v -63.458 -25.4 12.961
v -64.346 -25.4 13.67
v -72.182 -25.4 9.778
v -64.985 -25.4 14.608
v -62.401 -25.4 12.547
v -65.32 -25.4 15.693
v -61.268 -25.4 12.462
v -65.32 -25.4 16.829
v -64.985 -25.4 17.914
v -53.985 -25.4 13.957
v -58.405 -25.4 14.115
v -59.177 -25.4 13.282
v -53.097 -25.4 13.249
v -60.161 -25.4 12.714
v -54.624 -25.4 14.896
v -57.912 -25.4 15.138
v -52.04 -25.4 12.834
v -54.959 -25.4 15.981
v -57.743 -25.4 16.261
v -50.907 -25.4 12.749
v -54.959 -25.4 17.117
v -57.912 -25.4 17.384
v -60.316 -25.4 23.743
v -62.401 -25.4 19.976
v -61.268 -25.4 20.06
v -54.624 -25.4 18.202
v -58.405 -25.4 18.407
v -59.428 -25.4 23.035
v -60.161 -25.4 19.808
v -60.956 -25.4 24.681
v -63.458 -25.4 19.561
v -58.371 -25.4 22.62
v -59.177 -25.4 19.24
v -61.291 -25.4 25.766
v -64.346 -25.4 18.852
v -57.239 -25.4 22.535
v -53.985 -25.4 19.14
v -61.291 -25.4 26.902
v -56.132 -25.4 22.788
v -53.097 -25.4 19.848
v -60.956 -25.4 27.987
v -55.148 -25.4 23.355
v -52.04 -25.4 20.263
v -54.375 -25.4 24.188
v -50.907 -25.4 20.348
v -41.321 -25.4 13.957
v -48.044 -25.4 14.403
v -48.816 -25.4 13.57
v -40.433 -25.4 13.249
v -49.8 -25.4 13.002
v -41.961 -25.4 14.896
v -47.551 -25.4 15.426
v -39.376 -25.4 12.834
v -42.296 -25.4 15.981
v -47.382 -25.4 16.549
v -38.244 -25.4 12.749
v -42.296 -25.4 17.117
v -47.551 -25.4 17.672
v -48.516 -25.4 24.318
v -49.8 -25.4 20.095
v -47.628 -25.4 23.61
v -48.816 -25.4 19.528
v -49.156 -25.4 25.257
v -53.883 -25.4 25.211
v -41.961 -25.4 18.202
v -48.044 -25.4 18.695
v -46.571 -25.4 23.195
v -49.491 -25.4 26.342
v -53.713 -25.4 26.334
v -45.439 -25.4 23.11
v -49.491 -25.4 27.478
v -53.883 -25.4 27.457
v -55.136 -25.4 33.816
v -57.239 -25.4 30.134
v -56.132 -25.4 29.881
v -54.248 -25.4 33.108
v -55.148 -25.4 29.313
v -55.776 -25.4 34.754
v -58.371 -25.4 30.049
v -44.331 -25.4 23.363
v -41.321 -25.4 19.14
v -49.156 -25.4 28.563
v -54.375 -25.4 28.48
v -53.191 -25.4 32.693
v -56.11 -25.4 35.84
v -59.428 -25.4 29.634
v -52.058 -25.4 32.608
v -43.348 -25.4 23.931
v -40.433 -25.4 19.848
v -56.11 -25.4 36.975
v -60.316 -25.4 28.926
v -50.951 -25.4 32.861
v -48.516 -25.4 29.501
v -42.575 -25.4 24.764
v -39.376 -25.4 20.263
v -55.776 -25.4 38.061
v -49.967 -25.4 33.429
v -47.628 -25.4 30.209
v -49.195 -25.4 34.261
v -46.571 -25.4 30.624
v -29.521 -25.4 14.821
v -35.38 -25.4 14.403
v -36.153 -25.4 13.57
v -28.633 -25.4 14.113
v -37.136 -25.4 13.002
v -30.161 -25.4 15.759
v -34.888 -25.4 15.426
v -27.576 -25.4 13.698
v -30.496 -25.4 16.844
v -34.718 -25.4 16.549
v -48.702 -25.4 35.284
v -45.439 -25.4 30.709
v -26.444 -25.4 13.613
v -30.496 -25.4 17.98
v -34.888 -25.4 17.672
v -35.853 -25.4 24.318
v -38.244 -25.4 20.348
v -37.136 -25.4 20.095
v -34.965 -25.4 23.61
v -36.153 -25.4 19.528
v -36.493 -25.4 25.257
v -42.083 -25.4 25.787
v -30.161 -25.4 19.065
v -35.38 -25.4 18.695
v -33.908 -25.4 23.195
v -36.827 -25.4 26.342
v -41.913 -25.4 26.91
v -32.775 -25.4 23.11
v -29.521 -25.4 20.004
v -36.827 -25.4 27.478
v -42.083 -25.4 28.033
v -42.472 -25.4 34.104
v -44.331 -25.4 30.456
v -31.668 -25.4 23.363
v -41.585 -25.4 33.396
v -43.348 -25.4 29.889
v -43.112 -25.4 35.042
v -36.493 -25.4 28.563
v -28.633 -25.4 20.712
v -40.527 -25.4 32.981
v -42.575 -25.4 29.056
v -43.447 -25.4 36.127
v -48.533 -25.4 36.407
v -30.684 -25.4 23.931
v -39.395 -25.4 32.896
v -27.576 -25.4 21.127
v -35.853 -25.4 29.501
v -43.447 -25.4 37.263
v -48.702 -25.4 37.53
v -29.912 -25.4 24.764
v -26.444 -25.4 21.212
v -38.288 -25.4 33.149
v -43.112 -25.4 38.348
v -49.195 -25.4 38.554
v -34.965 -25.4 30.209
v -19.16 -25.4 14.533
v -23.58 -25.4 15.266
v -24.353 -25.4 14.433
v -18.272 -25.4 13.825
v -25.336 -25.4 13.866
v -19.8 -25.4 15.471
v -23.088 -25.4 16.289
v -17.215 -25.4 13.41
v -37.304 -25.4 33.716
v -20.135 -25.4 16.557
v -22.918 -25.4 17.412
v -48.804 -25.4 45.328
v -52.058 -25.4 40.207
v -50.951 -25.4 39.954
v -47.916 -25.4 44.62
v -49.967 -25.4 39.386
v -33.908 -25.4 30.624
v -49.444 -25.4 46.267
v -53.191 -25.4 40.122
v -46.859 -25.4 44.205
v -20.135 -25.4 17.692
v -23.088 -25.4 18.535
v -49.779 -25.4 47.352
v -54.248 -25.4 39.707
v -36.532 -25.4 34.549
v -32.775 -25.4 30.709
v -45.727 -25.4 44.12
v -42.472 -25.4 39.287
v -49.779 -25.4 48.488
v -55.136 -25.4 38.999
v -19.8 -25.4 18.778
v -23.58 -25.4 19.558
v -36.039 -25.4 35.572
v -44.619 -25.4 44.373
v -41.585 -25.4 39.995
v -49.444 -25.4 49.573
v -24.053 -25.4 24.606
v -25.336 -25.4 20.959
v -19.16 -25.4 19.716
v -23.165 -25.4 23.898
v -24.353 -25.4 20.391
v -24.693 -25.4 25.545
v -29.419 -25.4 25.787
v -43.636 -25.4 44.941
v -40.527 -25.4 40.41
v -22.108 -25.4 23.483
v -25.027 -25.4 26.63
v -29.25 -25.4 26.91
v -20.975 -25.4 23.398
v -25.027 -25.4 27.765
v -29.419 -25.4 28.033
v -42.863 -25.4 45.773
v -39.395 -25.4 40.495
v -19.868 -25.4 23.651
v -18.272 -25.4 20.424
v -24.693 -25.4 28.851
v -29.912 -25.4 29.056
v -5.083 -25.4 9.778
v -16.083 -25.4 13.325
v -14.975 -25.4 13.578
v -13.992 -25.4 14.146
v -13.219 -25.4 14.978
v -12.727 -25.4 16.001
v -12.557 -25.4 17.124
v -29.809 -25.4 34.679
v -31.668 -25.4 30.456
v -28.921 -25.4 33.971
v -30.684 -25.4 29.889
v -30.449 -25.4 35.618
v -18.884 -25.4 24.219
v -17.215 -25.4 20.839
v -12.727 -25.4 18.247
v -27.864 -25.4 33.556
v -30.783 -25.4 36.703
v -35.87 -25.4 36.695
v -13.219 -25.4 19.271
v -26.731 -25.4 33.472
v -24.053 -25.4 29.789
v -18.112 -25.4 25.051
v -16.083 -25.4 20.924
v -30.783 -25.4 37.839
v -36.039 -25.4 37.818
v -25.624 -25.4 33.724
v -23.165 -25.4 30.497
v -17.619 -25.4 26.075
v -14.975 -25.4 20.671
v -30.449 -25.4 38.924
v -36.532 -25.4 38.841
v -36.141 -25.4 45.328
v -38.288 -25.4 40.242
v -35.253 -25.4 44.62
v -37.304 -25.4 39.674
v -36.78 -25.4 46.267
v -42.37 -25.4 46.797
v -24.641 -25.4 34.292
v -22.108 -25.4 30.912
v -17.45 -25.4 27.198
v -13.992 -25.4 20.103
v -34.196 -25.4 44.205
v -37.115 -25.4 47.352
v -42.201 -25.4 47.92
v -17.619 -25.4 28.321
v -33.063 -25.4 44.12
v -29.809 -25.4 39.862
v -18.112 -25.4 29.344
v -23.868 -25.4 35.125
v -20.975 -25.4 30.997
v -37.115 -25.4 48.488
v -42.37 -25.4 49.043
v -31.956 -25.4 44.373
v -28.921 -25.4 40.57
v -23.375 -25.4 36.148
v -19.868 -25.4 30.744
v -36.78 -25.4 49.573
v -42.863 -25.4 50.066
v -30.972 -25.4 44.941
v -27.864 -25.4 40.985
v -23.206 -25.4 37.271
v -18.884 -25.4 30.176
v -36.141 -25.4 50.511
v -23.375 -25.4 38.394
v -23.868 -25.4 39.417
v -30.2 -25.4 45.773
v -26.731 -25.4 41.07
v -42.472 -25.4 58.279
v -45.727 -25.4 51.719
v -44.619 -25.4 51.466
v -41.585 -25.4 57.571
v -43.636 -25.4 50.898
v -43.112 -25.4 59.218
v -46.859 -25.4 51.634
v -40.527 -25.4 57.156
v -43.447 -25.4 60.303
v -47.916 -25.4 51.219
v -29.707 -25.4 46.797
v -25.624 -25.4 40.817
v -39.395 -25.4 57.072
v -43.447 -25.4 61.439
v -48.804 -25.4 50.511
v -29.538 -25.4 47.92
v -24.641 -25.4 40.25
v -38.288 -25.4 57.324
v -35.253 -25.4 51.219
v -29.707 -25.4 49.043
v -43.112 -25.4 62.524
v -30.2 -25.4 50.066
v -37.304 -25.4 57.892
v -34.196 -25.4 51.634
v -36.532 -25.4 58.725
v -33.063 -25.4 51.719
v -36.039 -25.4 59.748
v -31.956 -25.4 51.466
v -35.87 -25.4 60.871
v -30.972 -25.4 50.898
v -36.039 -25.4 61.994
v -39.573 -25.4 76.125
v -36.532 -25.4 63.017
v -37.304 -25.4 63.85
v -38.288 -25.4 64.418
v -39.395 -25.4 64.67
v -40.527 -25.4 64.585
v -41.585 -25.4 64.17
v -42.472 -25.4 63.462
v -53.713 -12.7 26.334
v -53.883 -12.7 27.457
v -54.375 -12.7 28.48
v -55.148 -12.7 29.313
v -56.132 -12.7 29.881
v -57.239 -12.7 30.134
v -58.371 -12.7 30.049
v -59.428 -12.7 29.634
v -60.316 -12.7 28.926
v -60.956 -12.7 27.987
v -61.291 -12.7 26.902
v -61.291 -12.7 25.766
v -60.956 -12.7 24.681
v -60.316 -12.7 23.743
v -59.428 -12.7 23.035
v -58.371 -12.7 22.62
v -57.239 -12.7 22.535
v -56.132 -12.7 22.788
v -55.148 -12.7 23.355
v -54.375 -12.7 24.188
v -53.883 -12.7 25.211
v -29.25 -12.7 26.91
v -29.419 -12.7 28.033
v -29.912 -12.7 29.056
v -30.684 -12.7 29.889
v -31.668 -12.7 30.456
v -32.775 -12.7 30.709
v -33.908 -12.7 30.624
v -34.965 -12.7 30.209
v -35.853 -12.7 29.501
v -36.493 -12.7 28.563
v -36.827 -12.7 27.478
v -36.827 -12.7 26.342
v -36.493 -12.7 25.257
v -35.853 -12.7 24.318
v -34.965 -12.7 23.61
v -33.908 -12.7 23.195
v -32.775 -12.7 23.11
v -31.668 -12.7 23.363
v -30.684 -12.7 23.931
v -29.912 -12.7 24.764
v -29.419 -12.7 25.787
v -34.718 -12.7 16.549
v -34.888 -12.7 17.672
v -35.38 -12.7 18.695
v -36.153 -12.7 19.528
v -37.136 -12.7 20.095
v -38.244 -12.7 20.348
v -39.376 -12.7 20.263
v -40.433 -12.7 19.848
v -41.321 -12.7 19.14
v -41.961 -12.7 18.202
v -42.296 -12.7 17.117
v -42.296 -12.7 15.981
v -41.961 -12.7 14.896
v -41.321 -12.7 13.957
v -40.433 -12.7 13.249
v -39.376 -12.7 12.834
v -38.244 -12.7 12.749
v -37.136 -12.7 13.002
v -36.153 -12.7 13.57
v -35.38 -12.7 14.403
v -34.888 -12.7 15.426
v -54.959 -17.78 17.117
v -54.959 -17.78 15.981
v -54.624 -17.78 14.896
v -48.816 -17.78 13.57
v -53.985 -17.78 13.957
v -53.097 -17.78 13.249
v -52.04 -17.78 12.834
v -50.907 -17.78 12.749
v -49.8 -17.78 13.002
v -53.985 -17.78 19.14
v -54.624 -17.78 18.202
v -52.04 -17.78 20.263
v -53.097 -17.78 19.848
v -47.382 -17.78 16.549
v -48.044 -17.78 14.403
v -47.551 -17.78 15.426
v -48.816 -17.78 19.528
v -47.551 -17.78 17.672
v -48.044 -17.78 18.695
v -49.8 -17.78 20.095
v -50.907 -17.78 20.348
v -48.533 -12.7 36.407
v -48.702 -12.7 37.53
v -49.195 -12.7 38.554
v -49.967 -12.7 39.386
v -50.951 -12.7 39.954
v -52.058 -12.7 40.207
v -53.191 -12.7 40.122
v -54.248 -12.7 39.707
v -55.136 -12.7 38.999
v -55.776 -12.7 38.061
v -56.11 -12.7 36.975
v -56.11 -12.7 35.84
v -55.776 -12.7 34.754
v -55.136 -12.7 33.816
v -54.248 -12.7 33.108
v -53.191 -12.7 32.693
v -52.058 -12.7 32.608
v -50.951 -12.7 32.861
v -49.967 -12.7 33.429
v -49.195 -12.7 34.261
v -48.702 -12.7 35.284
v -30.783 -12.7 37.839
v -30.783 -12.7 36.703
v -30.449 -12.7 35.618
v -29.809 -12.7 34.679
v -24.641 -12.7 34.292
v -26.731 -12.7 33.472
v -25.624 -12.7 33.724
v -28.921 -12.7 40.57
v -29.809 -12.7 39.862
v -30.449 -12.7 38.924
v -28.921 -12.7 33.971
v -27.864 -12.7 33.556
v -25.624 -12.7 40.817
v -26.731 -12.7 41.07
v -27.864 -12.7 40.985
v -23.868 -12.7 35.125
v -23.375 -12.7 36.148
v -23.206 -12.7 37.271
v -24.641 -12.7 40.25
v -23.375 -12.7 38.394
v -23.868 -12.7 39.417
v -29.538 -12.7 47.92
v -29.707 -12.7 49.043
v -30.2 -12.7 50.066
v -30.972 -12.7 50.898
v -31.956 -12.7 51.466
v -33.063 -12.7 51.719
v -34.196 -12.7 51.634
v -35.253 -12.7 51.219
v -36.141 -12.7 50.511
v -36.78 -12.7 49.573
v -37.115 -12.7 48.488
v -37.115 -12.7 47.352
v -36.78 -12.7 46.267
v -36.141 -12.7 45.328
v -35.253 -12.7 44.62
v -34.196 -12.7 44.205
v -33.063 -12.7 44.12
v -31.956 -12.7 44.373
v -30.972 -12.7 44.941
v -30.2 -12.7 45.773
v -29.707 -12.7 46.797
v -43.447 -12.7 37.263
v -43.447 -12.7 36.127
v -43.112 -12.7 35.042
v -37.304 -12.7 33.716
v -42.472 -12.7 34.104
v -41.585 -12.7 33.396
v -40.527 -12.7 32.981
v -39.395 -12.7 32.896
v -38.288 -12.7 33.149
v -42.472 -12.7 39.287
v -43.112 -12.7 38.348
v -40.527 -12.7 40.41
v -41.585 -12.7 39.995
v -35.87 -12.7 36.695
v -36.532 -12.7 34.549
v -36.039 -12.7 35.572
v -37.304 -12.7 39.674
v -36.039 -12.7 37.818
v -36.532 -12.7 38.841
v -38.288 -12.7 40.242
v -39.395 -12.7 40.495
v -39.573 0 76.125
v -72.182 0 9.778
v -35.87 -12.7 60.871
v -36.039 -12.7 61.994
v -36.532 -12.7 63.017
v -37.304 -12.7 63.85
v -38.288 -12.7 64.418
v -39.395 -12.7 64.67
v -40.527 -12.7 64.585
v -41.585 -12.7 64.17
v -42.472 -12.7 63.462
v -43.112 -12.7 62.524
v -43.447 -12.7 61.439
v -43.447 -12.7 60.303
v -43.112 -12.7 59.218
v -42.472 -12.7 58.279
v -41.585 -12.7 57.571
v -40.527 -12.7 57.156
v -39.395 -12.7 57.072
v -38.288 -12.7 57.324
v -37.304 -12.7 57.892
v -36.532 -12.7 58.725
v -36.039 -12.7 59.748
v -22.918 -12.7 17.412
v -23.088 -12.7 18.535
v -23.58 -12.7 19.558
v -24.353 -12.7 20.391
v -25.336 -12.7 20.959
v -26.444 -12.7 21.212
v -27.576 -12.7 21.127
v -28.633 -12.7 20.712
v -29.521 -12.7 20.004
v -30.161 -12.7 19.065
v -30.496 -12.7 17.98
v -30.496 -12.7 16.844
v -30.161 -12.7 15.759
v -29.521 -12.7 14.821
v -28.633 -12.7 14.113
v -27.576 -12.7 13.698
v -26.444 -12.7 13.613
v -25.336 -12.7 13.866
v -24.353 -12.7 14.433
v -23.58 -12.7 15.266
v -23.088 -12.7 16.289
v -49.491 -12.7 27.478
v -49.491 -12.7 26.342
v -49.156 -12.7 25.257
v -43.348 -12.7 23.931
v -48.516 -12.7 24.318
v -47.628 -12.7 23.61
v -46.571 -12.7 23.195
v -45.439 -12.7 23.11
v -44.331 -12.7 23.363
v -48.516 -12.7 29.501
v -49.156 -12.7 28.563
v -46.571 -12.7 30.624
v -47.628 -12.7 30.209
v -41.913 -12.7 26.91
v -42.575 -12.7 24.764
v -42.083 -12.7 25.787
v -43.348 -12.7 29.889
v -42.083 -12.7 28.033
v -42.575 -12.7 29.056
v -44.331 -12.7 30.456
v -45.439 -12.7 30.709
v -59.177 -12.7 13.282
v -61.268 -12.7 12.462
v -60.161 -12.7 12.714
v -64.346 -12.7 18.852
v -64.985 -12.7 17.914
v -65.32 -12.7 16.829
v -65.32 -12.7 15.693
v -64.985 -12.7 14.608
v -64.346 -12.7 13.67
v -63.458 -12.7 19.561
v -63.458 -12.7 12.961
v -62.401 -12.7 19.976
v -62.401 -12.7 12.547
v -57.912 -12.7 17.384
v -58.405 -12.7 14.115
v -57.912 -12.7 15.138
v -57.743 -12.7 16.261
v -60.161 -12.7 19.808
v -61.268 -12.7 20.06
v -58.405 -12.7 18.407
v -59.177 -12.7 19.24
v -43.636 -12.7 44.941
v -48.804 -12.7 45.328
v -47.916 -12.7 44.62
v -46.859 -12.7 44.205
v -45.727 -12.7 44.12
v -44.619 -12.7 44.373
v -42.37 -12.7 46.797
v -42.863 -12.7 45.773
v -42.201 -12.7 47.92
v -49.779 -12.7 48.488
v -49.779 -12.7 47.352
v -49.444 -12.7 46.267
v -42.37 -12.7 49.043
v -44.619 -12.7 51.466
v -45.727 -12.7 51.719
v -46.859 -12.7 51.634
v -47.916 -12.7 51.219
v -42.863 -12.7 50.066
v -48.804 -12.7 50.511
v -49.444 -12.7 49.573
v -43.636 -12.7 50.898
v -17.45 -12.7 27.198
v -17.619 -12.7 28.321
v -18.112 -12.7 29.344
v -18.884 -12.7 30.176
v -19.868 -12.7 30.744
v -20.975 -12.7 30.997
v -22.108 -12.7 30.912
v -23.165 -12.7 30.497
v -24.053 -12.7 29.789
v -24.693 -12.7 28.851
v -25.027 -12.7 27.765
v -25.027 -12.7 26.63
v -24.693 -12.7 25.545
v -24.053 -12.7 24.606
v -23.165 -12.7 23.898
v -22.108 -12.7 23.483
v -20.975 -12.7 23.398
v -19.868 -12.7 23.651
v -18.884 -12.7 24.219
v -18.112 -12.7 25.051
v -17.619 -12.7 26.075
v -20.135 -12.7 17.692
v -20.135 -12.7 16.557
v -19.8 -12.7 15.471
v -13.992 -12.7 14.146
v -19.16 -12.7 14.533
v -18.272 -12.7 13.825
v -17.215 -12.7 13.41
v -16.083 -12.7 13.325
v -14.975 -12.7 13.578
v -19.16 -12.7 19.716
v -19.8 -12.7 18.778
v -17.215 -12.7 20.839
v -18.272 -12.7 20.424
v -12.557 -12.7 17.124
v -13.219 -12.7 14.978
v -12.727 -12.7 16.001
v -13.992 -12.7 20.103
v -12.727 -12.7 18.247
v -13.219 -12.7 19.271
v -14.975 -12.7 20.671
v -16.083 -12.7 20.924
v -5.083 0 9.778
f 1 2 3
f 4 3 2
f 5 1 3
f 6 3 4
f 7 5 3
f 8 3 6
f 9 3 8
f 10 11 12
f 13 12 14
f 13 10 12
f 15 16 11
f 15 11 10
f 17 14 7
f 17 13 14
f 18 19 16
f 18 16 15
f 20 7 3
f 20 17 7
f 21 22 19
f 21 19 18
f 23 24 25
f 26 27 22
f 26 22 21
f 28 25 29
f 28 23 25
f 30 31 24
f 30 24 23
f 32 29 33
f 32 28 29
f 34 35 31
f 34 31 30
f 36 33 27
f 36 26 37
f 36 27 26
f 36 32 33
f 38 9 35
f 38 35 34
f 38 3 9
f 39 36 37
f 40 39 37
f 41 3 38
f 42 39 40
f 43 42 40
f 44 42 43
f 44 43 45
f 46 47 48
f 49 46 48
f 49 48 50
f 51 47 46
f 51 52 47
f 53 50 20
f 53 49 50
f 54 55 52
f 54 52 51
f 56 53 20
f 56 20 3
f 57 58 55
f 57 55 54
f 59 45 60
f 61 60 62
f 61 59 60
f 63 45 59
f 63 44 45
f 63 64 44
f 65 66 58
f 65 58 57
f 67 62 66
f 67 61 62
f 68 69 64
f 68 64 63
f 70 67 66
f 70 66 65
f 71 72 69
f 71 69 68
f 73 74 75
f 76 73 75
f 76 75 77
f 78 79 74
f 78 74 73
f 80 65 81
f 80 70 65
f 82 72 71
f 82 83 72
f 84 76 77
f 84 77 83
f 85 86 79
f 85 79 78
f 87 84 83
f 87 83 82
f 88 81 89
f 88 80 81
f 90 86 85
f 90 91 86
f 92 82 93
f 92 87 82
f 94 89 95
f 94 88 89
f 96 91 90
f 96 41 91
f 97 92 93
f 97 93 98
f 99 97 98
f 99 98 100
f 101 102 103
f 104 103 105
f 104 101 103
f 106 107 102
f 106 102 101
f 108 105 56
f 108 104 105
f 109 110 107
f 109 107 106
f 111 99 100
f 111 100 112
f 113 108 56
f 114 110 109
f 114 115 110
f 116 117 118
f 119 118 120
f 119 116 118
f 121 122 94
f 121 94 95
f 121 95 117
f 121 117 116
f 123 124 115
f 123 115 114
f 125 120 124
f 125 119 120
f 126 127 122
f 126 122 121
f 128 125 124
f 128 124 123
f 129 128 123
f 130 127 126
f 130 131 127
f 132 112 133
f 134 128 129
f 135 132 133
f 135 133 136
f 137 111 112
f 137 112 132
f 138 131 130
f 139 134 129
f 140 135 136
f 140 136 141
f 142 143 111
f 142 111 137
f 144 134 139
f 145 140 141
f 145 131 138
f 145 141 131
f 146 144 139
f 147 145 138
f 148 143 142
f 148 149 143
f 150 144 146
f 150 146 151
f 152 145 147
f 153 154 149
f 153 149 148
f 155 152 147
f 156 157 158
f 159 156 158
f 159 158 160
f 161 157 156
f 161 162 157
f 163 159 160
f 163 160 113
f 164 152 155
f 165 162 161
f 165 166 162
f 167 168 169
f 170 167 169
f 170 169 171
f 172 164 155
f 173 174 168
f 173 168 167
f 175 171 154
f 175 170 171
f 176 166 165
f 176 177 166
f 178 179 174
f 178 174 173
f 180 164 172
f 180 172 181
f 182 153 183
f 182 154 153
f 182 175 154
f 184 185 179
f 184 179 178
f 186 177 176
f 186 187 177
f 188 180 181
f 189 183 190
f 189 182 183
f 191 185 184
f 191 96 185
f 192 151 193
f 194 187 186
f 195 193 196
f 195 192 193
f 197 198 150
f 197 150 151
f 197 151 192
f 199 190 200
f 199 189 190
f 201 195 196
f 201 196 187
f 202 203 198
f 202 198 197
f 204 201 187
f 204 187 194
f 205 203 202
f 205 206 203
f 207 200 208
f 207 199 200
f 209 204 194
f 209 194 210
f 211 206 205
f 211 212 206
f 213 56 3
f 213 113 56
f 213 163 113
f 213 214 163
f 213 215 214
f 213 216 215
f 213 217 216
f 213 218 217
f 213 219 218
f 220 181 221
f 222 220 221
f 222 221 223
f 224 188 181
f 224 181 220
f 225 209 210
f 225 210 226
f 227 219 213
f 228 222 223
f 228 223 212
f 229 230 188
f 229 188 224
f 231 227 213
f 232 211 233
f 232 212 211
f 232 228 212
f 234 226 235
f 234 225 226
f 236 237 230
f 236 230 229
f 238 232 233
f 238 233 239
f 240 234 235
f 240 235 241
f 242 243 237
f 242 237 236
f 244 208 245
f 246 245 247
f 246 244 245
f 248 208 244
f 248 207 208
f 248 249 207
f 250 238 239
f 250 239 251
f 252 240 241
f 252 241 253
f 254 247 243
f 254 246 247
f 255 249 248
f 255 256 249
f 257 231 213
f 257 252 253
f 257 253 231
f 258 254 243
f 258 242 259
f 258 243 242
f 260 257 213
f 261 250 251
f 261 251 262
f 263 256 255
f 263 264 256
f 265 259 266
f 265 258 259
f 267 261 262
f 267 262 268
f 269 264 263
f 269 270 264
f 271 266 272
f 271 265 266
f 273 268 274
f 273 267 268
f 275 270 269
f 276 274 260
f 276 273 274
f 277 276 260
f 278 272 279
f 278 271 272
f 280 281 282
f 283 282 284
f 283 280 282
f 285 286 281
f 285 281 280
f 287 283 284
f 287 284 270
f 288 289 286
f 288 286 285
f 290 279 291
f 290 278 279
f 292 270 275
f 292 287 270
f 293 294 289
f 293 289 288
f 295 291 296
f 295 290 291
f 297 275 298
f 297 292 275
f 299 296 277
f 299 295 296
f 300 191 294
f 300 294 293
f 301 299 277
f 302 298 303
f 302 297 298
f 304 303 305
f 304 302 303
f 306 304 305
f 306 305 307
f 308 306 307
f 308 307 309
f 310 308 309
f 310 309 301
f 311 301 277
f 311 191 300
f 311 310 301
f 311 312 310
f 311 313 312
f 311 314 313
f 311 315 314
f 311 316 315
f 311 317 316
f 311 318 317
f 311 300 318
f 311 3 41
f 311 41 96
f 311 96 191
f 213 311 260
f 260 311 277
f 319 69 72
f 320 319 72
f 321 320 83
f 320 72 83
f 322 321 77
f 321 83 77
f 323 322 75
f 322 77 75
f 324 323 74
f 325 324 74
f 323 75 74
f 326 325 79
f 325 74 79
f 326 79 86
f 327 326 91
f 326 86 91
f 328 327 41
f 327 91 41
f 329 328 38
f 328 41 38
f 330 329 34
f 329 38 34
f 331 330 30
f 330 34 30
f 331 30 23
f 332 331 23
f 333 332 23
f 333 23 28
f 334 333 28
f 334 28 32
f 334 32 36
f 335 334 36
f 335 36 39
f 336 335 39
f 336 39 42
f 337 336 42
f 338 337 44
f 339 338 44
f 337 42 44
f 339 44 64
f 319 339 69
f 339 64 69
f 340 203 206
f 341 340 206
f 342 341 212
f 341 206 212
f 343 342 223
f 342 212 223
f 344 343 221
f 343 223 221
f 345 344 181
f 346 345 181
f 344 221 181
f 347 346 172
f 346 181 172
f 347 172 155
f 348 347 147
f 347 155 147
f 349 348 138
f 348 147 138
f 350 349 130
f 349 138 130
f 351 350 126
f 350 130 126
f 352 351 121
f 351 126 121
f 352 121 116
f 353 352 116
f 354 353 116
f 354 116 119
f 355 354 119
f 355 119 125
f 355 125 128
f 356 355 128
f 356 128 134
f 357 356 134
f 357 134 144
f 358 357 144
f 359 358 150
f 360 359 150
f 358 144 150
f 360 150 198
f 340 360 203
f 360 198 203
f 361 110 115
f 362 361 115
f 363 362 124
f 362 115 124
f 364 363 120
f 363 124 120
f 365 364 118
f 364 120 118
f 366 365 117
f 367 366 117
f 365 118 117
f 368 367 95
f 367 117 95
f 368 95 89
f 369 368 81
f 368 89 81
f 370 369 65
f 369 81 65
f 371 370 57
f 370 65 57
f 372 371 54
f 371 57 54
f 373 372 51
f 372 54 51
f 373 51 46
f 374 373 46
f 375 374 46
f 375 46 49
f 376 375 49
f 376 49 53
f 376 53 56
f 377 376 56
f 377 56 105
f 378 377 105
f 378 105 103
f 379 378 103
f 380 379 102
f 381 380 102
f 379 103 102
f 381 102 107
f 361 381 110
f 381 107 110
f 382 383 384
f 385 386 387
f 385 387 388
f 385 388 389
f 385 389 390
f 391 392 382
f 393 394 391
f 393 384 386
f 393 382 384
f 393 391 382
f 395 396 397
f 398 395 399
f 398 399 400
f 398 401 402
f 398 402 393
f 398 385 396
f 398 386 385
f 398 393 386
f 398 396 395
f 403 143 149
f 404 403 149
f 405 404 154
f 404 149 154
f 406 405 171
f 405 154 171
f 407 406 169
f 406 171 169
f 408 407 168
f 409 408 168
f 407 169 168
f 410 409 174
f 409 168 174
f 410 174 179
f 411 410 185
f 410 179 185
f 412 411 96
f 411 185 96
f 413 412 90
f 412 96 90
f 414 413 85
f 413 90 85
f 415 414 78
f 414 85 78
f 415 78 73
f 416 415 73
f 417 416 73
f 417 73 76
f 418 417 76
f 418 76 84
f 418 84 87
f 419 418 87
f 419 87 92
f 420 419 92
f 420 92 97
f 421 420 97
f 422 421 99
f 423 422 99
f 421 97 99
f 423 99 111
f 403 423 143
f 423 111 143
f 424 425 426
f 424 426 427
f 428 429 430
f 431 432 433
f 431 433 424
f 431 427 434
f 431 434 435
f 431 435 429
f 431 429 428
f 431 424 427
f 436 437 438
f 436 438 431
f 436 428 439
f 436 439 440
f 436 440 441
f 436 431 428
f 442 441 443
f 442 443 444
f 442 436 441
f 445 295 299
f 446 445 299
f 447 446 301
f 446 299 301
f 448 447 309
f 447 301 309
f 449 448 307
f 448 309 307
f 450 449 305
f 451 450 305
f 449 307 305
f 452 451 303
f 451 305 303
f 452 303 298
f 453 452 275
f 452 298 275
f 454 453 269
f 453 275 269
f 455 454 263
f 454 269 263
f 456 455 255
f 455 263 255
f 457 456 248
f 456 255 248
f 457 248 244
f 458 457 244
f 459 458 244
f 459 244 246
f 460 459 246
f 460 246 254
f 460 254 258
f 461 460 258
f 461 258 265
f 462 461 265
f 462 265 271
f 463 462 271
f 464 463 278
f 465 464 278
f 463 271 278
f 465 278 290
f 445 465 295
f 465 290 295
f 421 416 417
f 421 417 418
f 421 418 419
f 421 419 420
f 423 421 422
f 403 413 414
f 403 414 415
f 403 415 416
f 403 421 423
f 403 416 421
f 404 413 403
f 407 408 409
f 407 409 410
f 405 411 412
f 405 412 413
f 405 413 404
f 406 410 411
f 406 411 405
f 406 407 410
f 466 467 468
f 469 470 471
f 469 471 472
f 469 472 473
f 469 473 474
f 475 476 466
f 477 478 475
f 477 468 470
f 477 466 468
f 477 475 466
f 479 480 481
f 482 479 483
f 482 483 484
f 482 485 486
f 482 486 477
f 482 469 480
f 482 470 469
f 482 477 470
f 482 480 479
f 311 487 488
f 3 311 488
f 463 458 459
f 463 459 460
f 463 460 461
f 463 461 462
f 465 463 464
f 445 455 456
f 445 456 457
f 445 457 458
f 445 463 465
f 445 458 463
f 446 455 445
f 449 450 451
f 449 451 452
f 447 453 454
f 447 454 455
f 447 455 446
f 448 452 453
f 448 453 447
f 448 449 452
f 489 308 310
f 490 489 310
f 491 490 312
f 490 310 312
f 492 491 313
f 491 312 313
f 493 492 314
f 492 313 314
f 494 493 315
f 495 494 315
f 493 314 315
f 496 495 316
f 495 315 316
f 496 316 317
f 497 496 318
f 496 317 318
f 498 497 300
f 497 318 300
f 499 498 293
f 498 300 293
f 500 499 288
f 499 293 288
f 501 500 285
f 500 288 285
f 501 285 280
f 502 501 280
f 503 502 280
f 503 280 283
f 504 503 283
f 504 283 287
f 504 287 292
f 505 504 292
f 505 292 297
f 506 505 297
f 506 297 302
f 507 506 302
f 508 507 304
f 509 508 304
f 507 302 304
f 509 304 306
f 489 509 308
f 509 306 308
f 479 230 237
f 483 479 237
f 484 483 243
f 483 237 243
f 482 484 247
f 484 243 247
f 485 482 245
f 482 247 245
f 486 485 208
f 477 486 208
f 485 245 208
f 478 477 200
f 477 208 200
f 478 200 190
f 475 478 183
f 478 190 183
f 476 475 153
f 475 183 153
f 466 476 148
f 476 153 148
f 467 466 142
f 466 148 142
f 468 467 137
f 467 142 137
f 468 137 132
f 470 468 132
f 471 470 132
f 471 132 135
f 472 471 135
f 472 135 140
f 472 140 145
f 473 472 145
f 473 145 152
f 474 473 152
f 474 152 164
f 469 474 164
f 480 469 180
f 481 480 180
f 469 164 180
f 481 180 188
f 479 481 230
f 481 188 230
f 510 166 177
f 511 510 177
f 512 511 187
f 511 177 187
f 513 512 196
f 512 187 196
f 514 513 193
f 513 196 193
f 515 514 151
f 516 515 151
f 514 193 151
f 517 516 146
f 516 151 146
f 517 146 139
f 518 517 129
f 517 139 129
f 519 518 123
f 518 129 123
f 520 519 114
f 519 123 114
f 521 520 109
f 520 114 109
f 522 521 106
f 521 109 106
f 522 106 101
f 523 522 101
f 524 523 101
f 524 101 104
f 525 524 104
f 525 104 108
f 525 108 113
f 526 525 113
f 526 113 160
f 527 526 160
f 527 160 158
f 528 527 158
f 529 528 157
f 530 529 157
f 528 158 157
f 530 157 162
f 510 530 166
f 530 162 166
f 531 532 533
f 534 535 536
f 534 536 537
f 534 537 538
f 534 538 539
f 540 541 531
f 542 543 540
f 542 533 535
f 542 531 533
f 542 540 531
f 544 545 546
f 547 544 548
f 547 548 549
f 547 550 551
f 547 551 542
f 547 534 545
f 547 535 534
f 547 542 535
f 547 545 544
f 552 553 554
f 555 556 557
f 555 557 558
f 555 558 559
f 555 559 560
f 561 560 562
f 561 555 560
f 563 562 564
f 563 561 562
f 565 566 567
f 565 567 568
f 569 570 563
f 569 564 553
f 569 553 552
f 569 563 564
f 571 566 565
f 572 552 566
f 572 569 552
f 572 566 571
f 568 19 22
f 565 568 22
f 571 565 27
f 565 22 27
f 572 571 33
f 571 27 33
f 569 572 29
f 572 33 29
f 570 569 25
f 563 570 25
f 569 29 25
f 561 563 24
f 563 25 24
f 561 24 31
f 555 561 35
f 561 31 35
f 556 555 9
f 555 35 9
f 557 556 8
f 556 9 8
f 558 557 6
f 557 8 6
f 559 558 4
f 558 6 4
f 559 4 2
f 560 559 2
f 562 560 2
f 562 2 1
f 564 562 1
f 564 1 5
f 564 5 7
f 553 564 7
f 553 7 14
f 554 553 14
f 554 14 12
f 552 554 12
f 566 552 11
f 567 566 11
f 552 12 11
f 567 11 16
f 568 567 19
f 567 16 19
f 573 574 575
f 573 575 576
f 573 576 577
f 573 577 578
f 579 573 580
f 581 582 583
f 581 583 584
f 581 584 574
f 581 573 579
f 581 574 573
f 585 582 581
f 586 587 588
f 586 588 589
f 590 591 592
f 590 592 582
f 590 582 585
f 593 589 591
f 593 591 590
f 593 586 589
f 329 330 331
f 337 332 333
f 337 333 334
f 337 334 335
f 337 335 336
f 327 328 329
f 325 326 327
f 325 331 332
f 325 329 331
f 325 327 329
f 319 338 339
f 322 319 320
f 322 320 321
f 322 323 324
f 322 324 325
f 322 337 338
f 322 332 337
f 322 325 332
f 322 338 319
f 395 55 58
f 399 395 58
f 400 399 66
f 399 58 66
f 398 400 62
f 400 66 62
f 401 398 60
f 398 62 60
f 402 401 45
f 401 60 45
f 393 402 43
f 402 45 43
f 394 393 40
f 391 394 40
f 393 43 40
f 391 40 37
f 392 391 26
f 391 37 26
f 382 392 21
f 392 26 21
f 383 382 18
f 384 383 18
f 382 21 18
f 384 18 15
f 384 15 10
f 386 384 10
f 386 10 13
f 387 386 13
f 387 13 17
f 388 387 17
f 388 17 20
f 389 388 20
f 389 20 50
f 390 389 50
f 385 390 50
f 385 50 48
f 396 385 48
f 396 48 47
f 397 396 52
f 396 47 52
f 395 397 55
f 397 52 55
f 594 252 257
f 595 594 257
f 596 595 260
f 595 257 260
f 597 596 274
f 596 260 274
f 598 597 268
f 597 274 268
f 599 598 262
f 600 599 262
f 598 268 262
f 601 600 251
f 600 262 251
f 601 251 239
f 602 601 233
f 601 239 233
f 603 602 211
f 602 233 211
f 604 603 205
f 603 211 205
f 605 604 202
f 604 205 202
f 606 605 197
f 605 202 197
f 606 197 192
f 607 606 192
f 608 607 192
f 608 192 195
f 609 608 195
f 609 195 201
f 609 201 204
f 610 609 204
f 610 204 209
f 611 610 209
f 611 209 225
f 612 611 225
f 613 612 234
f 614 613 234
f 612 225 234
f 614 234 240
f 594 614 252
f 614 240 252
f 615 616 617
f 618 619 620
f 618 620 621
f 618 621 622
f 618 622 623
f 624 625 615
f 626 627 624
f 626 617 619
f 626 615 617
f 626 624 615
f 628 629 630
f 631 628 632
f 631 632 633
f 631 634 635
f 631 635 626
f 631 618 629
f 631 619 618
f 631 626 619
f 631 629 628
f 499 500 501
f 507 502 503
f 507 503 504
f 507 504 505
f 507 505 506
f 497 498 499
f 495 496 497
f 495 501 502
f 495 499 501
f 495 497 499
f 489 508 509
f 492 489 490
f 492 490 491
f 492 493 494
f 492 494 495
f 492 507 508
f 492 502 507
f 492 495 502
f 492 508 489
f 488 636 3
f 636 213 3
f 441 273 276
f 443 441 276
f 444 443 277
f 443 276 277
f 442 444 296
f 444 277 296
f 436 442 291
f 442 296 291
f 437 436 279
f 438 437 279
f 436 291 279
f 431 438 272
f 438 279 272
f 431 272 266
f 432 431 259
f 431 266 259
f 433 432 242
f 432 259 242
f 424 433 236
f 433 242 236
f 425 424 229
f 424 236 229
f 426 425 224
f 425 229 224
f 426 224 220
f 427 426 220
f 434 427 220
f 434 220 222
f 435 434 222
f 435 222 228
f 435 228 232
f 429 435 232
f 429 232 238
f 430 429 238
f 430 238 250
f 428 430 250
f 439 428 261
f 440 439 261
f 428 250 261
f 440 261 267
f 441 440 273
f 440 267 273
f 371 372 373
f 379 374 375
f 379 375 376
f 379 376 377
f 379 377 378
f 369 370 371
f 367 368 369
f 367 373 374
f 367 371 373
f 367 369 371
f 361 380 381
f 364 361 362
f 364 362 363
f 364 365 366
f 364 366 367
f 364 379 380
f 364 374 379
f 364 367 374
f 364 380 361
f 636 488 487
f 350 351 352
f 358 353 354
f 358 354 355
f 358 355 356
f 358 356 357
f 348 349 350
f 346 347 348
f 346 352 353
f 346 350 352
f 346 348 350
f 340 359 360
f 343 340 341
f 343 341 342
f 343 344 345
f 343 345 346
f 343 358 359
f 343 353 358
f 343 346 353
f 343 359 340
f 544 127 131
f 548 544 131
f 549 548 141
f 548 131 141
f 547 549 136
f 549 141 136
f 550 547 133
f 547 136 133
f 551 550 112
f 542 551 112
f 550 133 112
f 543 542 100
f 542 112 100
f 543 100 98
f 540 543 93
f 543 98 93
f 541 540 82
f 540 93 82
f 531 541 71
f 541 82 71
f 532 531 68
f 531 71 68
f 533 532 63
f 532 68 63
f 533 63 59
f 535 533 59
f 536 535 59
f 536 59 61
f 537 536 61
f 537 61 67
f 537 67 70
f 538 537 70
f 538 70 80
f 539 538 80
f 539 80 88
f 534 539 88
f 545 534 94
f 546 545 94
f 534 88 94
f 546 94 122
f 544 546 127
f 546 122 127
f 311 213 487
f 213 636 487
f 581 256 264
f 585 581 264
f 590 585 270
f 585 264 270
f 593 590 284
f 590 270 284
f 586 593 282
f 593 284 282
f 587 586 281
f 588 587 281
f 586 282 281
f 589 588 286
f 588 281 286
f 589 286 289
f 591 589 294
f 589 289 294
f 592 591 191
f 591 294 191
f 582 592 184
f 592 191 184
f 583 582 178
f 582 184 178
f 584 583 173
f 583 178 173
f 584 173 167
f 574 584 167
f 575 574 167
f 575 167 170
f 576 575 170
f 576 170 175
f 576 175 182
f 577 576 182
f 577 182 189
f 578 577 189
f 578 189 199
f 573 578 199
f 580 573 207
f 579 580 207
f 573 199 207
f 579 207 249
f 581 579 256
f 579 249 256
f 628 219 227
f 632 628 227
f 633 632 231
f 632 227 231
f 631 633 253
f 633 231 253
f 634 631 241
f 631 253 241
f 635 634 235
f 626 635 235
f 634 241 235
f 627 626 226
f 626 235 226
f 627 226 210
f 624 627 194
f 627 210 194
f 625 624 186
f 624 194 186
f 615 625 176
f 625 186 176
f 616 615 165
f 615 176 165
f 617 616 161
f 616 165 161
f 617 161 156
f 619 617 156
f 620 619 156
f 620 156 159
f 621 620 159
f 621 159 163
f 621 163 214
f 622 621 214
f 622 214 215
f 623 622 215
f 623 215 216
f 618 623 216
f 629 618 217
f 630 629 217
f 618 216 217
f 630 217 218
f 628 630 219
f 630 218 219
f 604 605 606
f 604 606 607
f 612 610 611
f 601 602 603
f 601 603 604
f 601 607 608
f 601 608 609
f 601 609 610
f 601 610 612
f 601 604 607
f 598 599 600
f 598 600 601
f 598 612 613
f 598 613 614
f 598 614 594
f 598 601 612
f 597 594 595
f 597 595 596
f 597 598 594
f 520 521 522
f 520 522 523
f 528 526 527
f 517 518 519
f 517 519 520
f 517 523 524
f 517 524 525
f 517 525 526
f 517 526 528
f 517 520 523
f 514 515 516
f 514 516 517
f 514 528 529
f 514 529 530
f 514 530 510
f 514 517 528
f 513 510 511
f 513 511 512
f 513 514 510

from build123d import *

# Parameters (mm, degrees)
F1_DEPTH  = 25.4
F2_R      = 3.81
F3_DEPTH  = 12.7
F4_R      = 3.81
F5_DEPTH  = 12.7
F6_R      = 3.81
F7_DEPTH  = 12.7
F8_R      = 3.81
F9_DEPTH  = 12.7
F10_R     = 3.81
F11_DEPTH = 12.7
F12_R     = 3.81
F13_DEPTH = 12.7
F14_R     = 3.81
F15_DEPTH = 12.7
F16_R     = 3.81
F17_DEPTH = 12.7
F18_R     = 3.81
F19_DEPTH = 12.7
F20_R     = 3.81
F21_DEPTH = 12.7
F22_R     = 3.81
F23_DEPTH = 12.7
F24_R     = 3.81
F25_DEPTH = 7.62
F26_R     = 3.81
F27_DEPTH = 12.7
F28_R     = 3.81
F29_DEPTH = 12.7
F30_R     = 3.81
F31_DEPTH = 12.7
F33_DEPTH = 127


with BuildPart() as f1:
    # F0 (on Front) → F1 (new body)
    with BuildSketch(Plane.XZ):
        Polygon((-76.988041, 0), (0, 0), (-39.573293, 76.124623), align=None)
    extrude(amount=F1_DEPTH)

    # F2 (on face) → F3 (cut)
    with BuildSketch(Plane.XZ.offset(25.4)):
        with Locations((-39.679505, 60.870919)):
            Circle(F2_R)
    extrude(amount=-F3_DEPTH, mode=Mode.SUBTRACT)

    # F4 (on face) → F5 (cut)
    with BuildSketch(Plane.XZ.offset(25.4)):
        with Locations((-46.011232, 47.919661)):
            Circle(F4_R)
    extrude(amount=-F5_DEPTH, mode=Mode.SUBTRACT)

    # F6 (on face) → F7 (cut)
    with BuildSketch(Plane.XZ.offset(25.4)):
        with Locations((-33.347782, 47.919661)):
            Circle(F6_R)
    extrude(amount=-F7_DEPTH, mode=Mode.SUBTRACT)

    # F8 (on face) → F9 (cut)
    with BuildSketch(Plane.XZ.offset(25.4)):
        with Locations((-52.342959, 36.40743)):
            Circle(F8_R)
    extrude(amount=-F9_DEPTH, mode=Mode.SUBTRACT)

    # F10 (on face) → F11 (cut)
    with BuildSketch(Plane.XZ.offset(25.4)):
        with Locations((-39.679505, 36.695234)):
            Circle(F10_R)
    extrude(amount=-F11_DEPTH, mode=Mode.SUBTRACT)

    # F12 (on face) → F13 (cut)
    with BuildSketch(Plane.XZ.offset(25.4)):
        with Locations((-27.016053, 37.270848)):
            Circle(F12_R)
    extrude(amount=-F13_DEPTH, mode=Mode.SUBTRACT)

    # F14 (on face) → F15 (cut)
    with BuildSketch(Plane.XZ.offset(25.4)):
        with Locations((-57.523463, 26.334228)):
            Circle(F14_R)
    extrude(amount=-F15_DEPTH, mode=Mode.SUBTRACT)

    # F16 (on face) → F17 (cut)
    with BuildSketch(Plane.XZ.offset(25.4)):
        with Locations((-45.723427, 26.909837)):
            Circle(F16_R)
    extrude(amount=-F17_DEPTH, mode=Mode.SUBTRACT)

    # F18 (on face) → F19 (cut)
    with BuildSketch(Plane.XZ.offset(25.4)):
        with Locations((-33.059973, 26.909837)):
            Circle(F18_R)
    extrude(amount=-F19_DEPTH, mode=Mode.SUBTRACT)

    # F20 (on face) → F21 (cut)
    with BuildSketch(Plane.XZ.offset(25.4)):
        with Locations((-21.259937, 27.197644)):
            Circle(F20_R)
    extrude(amount=-F21_DEPTH, mode=Mode.SUBTRACT)

    # F22 (on face) → F23 (cut)
    with BuildSketch(Plane.XZ.offset(25.4)):
        with Locations((-61.552744, 16.261026)):
            Circle(F22_R)
    extrude(amount=-F23_DEPTH, mode=Mode.SUBTRACT)

    # F24 (on face) → F25 (cut)
    with BuildSketch(Plane.XZ.offset(25.4)):
        with Locations((-51.191736, 16.548831)):
            Circle(F24_R)
    extrude(amount=-F25_DEPTH, mode=Mode.SUBTRACT)

    # F26 (on face) → F27 (cut)
    with BuildSketch(Plane.XZ.offset(25.4)):
        with Locations((-38.528282, 16.548831)):
            Circle(F26_R)
    extrude(amount=-F27_DEPTH, mode=Mode.SUBTRACT)

    # F28 (on face) → F29 (cut)
    with BuildSketch(Plane.XZ.offset(25.4)):
        with Locations((-26.728246, 17.412249)):
            Circle(F28_R)
    extrude(amount=-F29_DEPTH, mode=Mode.SUBTRACT)

    # F30 (on face) → F31 (cut)
    with BuildSketch(Plane.XZ.offset(25.4)):
        with Locations((-16.367238, 17.124442)):
            Circle(F30_R)
    extrude(amount=-F31_DEPTH, mode=Mode.SUBTRACT)

    # F32 (on face) → F33 (cut)
    with BuildSketch(Plane.XZ.offset(25.4)):
        Polygon((-5.083223, 9.778273), (-72.182085, 9.778273), (-76.988041, 0), (0, 0), align=None)
    extrude(amount=-F33_DEPTH, mode=Mode.SUBTRACT)


solid = f1.part
